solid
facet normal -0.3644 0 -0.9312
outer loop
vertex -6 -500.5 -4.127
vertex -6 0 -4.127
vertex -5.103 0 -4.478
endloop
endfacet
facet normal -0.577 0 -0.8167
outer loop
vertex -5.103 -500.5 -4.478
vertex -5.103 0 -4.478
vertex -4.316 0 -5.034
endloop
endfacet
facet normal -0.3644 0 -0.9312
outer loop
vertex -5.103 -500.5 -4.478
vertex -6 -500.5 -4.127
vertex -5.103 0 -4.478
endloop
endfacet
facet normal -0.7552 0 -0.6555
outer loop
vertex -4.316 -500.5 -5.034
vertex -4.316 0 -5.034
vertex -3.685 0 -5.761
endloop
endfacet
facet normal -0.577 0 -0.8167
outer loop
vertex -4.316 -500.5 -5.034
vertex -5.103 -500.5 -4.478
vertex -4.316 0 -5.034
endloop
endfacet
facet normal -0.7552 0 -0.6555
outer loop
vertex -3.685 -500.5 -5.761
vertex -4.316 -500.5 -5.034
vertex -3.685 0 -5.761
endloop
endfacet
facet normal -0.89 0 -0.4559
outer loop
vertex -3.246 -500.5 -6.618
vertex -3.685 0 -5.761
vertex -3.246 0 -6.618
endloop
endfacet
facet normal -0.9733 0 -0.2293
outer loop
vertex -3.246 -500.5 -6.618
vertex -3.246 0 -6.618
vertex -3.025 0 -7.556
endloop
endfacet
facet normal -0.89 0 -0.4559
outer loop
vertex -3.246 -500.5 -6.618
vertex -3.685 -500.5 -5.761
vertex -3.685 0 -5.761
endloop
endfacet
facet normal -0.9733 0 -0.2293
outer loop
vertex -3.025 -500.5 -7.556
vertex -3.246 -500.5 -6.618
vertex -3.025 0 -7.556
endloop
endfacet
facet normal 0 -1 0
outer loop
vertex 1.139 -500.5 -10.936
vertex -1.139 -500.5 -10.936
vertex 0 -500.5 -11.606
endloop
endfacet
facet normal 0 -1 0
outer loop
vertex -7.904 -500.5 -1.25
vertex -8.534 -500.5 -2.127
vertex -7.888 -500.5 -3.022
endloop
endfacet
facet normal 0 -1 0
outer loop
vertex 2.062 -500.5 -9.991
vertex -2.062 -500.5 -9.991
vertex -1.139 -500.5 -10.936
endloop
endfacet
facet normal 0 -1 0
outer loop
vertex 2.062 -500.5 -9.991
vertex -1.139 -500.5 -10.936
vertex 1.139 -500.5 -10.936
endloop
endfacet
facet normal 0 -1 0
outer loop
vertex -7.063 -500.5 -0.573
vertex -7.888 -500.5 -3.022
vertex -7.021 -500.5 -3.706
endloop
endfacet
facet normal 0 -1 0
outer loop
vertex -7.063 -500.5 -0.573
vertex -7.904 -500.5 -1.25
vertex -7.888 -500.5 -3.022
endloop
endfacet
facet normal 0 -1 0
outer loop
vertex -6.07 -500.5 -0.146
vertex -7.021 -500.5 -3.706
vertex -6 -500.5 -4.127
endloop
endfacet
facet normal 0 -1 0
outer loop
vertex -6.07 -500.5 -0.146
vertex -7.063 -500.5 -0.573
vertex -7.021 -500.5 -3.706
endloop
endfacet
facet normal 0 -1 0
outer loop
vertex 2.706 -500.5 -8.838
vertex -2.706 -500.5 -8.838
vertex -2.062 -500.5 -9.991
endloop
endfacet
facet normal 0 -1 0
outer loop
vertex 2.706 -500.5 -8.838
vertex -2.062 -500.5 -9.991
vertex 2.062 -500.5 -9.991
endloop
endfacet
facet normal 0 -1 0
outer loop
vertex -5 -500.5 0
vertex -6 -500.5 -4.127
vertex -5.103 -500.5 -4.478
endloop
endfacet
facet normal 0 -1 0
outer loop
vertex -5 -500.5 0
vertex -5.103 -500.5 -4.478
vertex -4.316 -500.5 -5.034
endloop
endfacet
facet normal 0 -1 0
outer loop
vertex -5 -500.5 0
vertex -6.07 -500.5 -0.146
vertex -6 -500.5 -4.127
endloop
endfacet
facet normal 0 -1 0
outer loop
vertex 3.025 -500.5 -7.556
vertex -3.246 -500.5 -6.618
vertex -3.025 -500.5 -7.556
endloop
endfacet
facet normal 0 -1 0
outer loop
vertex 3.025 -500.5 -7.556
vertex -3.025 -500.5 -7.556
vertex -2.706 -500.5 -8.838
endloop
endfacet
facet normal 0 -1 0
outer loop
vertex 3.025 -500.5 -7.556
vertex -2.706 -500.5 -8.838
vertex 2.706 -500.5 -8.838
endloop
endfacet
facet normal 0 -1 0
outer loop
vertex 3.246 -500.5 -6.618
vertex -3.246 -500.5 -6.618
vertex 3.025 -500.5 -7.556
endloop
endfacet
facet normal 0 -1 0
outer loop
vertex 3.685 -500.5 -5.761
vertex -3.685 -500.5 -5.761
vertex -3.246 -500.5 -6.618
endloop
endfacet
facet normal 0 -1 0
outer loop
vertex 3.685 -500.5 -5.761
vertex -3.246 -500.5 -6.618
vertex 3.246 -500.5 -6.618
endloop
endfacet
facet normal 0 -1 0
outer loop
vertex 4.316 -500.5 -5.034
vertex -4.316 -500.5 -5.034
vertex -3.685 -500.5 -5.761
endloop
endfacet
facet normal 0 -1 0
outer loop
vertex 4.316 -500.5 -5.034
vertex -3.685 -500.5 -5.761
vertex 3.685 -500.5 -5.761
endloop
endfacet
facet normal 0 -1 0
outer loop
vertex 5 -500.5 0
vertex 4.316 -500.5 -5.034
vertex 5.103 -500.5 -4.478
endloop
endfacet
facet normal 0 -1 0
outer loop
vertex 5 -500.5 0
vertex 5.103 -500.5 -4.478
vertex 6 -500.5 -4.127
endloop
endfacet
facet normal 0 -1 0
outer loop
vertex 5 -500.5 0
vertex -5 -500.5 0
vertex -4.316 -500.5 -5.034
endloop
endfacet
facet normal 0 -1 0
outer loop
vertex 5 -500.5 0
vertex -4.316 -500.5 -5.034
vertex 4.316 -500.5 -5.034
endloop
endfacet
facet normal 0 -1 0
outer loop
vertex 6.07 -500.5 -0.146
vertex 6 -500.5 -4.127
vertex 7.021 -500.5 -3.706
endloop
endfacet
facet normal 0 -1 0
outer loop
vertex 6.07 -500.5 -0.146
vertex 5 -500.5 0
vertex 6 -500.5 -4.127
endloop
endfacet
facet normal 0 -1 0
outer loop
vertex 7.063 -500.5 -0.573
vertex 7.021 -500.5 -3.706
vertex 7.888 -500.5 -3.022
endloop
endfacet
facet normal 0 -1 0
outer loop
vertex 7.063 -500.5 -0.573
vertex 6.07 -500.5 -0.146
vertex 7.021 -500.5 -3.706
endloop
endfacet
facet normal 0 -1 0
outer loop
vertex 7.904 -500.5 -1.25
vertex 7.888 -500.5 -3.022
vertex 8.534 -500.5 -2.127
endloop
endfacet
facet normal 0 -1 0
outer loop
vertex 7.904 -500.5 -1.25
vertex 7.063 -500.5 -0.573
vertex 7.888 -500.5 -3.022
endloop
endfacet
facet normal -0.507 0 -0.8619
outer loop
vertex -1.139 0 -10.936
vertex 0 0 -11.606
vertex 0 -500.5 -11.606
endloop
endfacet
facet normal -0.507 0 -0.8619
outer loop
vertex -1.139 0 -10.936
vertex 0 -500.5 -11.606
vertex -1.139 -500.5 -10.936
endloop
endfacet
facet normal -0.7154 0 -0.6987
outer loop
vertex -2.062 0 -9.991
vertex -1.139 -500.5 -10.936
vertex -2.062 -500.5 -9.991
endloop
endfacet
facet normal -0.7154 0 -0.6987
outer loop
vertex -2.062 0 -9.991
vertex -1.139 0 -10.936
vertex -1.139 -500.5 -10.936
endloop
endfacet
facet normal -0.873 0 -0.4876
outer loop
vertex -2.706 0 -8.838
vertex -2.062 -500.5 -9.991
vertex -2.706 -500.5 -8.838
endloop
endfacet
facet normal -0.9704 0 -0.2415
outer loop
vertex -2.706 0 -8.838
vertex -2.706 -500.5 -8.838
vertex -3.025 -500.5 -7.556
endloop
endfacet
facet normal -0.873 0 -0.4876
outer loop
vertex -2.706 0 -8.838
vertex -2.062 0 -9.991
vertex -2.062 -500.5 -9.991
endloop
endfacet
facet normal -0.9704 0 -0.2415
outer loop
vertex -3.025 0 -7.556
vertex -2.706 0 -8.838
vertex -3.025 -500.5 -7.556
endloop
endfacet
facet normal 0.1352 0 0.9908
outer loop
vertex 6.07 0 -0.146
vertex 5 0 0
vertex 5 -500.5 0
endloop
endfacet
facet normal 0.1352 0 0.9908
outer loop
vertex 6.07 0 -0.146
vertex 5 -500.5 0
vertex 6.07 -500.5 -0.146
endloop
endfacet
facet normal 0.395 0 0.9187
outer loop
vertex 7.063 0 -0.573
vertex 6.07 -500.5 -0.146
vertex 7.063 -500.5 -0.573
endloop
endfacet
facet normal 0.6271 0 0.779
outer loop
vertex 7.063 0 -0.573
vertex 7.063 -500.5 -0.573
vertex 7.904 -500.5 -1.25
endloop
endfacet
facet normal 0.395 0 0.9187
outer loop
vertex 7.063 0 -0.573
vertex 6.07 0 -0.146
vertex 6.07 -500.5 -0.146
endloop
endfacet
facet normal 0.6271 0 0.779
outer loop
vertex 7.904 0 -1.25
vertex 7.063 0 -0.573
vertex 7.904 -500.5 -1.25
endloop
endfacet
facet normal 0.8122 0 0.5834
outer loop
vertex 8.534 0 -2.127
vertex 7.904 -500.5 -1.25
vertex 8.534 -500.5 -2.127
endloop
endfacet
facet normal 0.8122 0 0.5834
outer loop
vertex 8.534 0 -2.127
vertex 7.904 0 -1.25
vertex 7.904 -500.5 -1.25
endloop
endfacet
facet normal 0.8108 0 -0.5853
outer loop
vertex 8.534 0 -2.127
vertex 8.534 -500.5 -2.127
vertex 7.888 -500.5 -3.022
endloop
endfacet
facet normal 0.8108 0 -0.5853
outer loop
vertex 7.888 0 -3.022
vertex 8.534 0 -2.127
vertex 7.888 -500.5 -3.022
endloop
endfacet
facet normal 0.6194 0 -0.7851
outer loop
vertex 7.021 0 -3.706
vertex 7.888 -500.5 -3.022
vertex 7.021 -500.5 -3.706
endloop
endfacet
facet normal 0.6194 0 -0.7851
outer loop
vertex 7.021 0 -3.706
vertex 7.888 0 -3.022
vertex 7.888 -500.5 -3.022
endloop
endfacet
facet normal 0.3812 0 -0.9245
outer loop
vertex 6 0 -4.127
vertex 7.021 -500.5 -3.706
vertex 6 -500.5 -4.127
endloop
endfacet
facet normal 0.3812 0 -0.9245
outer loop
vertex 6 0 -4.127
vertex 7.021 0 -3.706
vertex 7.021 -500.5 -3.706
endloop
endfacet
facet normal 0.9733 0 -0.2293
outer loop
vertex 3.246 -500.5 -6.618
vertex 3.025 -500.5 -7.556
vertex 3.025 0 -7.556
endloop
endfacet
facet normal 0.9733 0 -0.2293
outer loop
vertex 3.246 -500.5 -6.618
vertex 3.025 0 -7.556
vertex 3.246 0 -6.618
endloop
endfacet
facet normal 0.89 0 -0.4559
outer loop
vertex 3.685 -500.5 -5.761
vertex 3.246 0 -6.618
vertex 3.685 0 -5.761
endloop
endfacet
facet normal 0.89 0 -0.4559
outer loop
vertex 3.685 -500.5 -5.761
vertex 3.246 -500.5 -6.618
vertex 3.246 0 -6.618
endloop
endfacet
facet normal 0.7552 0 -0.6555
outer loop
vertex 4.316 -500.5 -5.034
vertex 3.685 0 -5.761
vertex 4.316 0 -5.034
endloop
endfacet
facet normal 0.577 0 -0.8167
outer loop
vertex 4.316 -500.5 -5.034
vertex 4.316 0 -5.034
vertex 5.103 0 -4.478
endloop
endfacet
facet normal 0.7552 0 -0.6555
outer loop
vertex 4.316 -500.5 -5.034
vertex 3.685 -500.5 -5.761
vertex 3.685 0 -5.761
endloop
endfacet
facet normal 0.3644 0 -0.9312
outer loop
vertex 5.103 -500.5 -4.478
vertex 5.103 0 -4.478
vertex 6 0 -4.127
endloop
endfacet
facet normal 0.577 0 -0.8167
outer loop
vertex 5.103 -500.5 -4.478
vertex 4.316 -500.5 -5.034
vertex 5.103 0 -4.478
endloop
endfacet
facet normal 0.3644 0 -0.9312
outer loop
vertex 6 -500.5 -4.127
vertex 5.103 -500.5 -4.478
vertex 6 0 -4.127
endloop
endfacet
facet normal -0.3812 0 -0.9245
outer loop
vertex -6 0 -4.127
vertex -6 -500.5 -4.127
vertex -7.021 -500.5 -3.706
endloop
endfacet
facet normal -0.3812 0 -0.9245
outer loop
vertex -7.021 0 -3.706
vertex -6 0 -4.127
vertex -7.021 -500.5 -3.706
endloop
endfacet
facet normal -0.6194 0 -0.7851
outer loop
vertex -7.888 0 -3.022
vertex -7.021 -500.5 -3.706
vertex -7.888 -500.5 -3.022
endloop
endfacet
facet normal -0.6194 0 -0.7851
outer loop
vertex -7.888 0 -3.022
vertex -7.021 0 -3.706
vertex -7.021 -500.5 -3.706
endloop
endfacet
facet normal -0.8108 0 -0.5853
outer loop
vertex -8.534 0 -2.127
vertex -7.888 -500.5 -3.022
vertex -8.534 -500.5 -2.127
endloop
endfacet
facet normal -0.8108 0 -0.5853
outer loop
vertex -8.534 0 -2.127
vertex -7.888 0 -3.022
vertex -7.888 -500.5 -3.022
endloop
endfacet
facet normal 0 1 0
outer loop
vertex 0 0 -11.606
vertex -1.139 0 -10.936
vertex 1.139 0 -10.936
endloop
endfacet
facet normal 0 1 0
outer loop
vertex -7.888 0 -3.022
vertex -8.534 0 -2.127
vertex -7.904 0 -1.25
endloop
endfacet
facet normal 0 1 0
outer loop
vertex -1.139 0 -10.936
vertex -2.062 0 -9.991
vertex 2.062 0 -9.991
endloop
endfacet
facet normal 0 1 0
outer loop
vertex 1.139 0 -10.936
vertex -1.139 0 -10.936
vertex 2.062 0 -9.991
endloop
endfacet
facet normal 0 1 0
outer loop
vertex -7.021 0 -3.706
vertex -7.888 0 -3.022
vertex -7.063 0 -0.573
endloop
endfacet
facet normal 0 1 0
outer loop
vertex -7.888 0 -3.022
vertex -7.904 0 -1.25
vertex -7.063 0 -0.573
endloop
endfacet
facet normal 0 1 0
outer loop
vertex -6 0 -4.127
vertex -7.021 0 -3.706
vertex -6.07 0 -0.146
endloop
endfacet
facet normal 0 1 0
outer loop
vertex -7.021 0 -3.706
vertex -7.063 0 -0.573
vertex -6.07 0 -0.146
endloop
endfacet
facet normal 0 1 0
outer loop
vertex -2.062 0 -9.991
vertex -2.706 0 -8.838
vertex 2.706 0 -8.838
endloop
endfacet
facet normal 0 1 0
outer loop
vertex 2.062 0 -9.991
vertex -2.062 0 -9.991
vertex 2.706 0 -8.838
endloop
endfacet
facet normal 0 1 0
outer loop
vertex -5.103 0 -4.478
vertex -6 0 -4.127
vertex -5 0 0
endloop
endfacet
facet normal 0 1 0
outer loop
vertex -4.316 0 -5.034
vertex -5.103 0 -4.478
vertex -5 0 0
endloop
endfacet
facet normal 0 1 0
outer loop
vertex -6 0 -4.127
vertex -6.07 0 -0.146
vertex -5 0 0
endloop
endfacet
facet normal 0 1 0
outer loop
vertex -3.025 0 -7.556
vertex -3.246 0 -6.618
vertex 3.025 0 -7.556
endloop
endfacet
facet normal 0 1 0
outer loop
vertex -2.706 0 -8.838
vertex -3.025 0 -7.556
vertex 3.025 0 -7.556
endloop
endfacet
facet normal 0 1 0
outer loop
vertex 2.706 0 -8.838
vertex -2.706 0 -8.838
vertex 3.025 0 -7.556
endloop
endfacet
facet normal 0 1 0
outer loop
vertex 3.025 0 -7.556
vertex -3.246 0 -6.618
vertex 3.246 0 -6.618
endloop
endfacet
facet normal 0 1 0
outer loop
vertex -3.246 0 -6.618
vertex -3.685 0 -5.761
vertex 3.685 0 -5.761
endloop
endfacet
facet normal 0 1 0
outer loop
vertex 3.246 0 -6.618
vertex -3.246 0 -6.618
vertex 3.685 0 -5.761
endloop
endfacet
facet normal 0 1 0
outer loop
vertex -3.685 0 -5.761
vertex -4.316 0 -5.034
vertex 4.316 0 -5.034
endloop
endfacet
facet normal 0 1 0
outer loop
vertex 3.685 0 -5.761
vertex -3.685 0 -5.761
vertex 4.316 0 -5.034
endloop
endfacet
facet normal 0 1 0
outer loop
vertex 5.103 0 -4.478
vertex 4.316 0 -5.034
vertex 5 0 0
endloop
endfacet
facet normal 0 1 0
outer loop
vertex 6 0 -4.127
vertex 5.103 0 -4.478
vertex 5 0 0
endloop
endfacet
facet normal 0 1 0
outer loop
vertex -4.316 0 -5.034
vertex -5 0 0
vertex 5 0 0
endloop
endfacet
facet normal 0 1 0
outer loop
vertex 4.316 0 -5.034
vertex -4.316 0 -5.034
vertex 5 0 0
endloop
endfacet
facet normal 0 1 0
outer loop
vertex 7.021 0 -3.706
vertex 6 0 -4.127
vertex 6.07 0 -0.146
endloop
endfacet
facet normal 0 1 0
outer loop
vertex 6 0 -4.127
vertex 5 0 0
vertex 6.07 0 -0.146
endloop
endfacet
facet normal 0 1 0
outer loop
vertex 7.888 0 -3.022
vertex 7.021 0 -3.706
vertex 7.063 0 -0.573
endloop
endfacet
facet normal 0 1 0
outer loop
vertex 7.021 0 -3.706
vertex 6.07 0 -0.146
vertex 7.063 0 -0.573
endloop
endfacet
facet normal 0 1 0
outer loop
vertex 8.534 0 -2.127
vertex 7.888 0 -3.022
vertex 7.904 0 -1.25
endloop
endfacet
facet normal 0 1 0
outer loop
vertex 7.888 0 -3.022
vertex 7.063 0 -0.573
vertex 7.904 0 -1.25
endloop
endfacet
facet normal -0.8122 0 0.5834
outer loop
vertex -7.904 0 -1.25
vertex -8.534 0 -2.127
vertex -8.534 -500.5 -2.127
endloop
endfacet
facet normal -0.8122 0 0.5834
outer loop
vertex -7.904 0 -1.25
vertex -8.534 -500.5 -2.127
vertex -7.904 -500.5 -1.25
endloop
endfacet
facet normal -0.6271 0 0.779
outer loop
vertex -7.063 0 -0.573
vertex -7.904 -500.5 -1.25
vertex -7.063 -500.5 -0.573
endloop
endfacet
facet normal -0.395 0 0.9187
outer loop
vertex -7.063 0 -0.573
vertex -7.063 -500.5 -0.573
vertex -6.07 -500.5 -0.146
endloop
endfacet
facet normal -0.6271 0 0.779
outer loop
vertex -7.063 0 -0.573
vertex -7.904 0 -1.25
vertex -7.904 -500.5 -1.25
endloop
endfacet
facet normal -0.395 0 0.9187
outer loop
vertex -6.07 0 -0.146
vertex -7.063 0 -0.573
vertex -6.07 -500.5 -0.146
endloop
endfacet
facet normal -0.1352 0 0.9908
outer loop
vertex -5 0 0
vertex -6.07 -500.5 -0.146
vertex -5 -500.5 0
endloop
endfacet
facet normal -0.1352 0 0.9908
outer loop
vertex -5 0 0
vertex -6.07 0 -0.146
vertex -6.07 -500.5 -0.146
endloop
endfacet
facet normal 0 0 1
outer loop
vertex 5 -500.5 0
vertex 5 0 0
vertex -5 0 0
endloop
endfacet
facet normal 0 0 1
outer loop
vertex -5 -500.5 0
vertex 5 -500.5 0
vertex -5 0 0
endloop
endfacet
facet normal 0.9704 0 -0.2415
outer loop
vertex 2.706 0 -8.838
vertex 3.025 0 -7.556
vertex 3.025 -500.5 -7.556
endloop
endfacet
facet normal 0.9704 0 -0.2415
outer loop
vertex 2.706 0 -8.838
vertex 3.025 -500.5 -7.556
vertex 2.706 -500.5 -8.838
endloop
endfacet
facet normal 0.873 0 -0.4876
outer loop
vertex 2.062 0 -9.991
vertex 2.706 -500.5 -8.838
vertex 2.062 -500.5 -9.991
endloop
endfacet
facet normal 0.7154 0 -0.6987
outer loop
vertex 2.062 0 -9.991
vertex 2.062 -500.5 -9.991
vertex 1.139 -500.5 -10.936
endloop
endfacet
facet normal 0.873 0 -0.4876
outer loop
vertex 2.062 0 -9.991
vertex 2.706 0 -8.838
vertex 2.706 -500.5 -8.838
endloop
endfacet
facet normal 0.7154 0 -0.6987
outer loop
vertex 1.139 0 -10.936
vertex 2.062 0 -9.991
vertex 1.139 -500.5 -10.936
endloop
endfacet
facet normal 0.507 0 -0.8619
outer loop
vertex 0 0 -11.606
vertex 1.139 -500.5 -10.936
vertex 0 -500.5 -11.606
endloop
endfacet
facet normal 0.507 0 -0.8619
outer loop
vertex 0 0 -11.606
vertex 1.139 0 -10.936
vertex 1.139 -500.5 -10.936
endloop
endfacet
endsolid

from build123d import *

# Parameters (mm, degrees)
F1_DEPTH    = 500.5
F2_R        = 4
F3_T1_DEPTH = 520.5
F3_T3_DEPTH = 519.2298334621
F4_T1_DEPTH = 525.22135955


# Not quite as in the source:
# - a fillet or chamfer that OpenCascade refuses, or shapes differently, is made with other operations: its cross-section is extruded or revolved along the edge and cut away or added


with BuildPart() as f1:
    # F0 (on Front) → F1 (new body)
    with BuildSketch(Plane.XZ):
        Polygon((9, 0), (0, 0), (-9, 0), (-9, -4), (-3, -4), (-3, -12), (3, -12), (3, -4), (9, -4), align=None)
    extrude(amount=F1_DEPTH)

    # F2
    f2_edges = [f1.edges().sort_by_distance(p)[0] for p in [
        (3, -250.25, -4),
        (-3, -250.25, -4),
    ]]
    fillet(f2_edges, radius=F2_R)

    # F3: fillet of radius 4 on 4 edges, made by hand

    # F3_s2 → F3_t1 (cut)
    with BuildSketch(Plane.XZ.offset(-10)):
        with BuildLine():
            ThreePointArc((-9, -4), (-7.8284271247, -1.1715728753), (-5, 0))
            Line((-5, 0), (-9, 0))
            Line((-9, 0), (-9, -4))
        make_face()
        with BuildLine():
            ThreePointArc((5, 0), (7.8284271247, -1.1715728753), (9, -4))
            Line((9, -4), (9, 0))
            Line((9, 0), (5, 0))
        make_face()
    extrude(amount=F3_T1_DEPTH, mode=Mode.SUBTRACT)

    # F3_s4 → F3_t3 (cut)
    with BuildSketch(Plane.XZ.offset(-9.364916731)):
        with BuildLine():
            ThreePointArc((-6, -4.1270166538), (-8.1622776602, -2.7035230504), (-9, -0.2540333076))
            Line((-9, -0.2540333076), (-9.4, -0.2540333076))
            Line((-9.4, -0.2540333076), (-9.4, -4))
            Line((-9.4, -4), (-9, -4.4))
            ThreePointArc((-9, -4.4), (-7, -4.4), (-6.1, -4.5143149884))
            Line((-6.1, -4.5143149884), (-6, -4.1270166538))
        make_face()
        with BuildLine():
            ThreePointArc((9, -0.2540333076), (8.1622776602, -2.7035230504), (6, -4.1270166538))
            Line((6, -4.1270166538), (6.1, -4.5143149884))
            ThreePointArc((6.1, -4.5143149884), (7, -4.4), (9, -4.4))
            Line((9, -4.4), (9.4, -4))
            Line((9.4, -4), (9.4, -0.2540333076))
            Line((9.4, -0.2540333076), (9, -0.2540333076))
        make_face()
    extrude(amount=F3_T3_DEPTH, mode=Mode.SUBTRACT)

    # F4: fillet of radius 5 on 2 edges, made by hand

    # F4_s2 → F4_t1 (cut)
    with BuildSketch(Plane.XZ.offset(-12.360679775)):
        with BuildLine():
            ThreePointArc((3.02476804, -7.5555555556), (1.3890614233, -10.7267799625), (-1.94427191, -12))
            Line((-1.94427191, -12), (-1.94427191, -12.5))
            Line((-1.94427191, -12.5), (3, -12.5))
            Line((3, -12.5), (3.5, -12))
            ThreePointArc((3.5, -12), (3.5, -8), (3.521672035, -7.6111111111))
            Line((3.521672035, -7.6111111111), (3.02476804, -7.5555555556))
        make_face()
        with BuildLine():
            ThreePointArc((1.94427191, -12), (-1.3890614233, -10.7267799625), (-3.02476804, -7.5555555556))
            Line((-3.02476804, -7.5555555556), (-3.521672035, -7.6111111111))
            ThreePointArc((-3.521672035, -7.6111111111), (-3.5, -8), (-3.5, -12))
            Line((-3.5, -12), (-3, -12.5))
            Line((-3, -12.5), (1.94427191, -12.5))
            Line((1.94427191, -12.5), (1.94427191, -12))
        make_face()
    extrude(amount=F4_T1_DEPTH, mode=Mode.SUBTRACT)


solid = f1.part
